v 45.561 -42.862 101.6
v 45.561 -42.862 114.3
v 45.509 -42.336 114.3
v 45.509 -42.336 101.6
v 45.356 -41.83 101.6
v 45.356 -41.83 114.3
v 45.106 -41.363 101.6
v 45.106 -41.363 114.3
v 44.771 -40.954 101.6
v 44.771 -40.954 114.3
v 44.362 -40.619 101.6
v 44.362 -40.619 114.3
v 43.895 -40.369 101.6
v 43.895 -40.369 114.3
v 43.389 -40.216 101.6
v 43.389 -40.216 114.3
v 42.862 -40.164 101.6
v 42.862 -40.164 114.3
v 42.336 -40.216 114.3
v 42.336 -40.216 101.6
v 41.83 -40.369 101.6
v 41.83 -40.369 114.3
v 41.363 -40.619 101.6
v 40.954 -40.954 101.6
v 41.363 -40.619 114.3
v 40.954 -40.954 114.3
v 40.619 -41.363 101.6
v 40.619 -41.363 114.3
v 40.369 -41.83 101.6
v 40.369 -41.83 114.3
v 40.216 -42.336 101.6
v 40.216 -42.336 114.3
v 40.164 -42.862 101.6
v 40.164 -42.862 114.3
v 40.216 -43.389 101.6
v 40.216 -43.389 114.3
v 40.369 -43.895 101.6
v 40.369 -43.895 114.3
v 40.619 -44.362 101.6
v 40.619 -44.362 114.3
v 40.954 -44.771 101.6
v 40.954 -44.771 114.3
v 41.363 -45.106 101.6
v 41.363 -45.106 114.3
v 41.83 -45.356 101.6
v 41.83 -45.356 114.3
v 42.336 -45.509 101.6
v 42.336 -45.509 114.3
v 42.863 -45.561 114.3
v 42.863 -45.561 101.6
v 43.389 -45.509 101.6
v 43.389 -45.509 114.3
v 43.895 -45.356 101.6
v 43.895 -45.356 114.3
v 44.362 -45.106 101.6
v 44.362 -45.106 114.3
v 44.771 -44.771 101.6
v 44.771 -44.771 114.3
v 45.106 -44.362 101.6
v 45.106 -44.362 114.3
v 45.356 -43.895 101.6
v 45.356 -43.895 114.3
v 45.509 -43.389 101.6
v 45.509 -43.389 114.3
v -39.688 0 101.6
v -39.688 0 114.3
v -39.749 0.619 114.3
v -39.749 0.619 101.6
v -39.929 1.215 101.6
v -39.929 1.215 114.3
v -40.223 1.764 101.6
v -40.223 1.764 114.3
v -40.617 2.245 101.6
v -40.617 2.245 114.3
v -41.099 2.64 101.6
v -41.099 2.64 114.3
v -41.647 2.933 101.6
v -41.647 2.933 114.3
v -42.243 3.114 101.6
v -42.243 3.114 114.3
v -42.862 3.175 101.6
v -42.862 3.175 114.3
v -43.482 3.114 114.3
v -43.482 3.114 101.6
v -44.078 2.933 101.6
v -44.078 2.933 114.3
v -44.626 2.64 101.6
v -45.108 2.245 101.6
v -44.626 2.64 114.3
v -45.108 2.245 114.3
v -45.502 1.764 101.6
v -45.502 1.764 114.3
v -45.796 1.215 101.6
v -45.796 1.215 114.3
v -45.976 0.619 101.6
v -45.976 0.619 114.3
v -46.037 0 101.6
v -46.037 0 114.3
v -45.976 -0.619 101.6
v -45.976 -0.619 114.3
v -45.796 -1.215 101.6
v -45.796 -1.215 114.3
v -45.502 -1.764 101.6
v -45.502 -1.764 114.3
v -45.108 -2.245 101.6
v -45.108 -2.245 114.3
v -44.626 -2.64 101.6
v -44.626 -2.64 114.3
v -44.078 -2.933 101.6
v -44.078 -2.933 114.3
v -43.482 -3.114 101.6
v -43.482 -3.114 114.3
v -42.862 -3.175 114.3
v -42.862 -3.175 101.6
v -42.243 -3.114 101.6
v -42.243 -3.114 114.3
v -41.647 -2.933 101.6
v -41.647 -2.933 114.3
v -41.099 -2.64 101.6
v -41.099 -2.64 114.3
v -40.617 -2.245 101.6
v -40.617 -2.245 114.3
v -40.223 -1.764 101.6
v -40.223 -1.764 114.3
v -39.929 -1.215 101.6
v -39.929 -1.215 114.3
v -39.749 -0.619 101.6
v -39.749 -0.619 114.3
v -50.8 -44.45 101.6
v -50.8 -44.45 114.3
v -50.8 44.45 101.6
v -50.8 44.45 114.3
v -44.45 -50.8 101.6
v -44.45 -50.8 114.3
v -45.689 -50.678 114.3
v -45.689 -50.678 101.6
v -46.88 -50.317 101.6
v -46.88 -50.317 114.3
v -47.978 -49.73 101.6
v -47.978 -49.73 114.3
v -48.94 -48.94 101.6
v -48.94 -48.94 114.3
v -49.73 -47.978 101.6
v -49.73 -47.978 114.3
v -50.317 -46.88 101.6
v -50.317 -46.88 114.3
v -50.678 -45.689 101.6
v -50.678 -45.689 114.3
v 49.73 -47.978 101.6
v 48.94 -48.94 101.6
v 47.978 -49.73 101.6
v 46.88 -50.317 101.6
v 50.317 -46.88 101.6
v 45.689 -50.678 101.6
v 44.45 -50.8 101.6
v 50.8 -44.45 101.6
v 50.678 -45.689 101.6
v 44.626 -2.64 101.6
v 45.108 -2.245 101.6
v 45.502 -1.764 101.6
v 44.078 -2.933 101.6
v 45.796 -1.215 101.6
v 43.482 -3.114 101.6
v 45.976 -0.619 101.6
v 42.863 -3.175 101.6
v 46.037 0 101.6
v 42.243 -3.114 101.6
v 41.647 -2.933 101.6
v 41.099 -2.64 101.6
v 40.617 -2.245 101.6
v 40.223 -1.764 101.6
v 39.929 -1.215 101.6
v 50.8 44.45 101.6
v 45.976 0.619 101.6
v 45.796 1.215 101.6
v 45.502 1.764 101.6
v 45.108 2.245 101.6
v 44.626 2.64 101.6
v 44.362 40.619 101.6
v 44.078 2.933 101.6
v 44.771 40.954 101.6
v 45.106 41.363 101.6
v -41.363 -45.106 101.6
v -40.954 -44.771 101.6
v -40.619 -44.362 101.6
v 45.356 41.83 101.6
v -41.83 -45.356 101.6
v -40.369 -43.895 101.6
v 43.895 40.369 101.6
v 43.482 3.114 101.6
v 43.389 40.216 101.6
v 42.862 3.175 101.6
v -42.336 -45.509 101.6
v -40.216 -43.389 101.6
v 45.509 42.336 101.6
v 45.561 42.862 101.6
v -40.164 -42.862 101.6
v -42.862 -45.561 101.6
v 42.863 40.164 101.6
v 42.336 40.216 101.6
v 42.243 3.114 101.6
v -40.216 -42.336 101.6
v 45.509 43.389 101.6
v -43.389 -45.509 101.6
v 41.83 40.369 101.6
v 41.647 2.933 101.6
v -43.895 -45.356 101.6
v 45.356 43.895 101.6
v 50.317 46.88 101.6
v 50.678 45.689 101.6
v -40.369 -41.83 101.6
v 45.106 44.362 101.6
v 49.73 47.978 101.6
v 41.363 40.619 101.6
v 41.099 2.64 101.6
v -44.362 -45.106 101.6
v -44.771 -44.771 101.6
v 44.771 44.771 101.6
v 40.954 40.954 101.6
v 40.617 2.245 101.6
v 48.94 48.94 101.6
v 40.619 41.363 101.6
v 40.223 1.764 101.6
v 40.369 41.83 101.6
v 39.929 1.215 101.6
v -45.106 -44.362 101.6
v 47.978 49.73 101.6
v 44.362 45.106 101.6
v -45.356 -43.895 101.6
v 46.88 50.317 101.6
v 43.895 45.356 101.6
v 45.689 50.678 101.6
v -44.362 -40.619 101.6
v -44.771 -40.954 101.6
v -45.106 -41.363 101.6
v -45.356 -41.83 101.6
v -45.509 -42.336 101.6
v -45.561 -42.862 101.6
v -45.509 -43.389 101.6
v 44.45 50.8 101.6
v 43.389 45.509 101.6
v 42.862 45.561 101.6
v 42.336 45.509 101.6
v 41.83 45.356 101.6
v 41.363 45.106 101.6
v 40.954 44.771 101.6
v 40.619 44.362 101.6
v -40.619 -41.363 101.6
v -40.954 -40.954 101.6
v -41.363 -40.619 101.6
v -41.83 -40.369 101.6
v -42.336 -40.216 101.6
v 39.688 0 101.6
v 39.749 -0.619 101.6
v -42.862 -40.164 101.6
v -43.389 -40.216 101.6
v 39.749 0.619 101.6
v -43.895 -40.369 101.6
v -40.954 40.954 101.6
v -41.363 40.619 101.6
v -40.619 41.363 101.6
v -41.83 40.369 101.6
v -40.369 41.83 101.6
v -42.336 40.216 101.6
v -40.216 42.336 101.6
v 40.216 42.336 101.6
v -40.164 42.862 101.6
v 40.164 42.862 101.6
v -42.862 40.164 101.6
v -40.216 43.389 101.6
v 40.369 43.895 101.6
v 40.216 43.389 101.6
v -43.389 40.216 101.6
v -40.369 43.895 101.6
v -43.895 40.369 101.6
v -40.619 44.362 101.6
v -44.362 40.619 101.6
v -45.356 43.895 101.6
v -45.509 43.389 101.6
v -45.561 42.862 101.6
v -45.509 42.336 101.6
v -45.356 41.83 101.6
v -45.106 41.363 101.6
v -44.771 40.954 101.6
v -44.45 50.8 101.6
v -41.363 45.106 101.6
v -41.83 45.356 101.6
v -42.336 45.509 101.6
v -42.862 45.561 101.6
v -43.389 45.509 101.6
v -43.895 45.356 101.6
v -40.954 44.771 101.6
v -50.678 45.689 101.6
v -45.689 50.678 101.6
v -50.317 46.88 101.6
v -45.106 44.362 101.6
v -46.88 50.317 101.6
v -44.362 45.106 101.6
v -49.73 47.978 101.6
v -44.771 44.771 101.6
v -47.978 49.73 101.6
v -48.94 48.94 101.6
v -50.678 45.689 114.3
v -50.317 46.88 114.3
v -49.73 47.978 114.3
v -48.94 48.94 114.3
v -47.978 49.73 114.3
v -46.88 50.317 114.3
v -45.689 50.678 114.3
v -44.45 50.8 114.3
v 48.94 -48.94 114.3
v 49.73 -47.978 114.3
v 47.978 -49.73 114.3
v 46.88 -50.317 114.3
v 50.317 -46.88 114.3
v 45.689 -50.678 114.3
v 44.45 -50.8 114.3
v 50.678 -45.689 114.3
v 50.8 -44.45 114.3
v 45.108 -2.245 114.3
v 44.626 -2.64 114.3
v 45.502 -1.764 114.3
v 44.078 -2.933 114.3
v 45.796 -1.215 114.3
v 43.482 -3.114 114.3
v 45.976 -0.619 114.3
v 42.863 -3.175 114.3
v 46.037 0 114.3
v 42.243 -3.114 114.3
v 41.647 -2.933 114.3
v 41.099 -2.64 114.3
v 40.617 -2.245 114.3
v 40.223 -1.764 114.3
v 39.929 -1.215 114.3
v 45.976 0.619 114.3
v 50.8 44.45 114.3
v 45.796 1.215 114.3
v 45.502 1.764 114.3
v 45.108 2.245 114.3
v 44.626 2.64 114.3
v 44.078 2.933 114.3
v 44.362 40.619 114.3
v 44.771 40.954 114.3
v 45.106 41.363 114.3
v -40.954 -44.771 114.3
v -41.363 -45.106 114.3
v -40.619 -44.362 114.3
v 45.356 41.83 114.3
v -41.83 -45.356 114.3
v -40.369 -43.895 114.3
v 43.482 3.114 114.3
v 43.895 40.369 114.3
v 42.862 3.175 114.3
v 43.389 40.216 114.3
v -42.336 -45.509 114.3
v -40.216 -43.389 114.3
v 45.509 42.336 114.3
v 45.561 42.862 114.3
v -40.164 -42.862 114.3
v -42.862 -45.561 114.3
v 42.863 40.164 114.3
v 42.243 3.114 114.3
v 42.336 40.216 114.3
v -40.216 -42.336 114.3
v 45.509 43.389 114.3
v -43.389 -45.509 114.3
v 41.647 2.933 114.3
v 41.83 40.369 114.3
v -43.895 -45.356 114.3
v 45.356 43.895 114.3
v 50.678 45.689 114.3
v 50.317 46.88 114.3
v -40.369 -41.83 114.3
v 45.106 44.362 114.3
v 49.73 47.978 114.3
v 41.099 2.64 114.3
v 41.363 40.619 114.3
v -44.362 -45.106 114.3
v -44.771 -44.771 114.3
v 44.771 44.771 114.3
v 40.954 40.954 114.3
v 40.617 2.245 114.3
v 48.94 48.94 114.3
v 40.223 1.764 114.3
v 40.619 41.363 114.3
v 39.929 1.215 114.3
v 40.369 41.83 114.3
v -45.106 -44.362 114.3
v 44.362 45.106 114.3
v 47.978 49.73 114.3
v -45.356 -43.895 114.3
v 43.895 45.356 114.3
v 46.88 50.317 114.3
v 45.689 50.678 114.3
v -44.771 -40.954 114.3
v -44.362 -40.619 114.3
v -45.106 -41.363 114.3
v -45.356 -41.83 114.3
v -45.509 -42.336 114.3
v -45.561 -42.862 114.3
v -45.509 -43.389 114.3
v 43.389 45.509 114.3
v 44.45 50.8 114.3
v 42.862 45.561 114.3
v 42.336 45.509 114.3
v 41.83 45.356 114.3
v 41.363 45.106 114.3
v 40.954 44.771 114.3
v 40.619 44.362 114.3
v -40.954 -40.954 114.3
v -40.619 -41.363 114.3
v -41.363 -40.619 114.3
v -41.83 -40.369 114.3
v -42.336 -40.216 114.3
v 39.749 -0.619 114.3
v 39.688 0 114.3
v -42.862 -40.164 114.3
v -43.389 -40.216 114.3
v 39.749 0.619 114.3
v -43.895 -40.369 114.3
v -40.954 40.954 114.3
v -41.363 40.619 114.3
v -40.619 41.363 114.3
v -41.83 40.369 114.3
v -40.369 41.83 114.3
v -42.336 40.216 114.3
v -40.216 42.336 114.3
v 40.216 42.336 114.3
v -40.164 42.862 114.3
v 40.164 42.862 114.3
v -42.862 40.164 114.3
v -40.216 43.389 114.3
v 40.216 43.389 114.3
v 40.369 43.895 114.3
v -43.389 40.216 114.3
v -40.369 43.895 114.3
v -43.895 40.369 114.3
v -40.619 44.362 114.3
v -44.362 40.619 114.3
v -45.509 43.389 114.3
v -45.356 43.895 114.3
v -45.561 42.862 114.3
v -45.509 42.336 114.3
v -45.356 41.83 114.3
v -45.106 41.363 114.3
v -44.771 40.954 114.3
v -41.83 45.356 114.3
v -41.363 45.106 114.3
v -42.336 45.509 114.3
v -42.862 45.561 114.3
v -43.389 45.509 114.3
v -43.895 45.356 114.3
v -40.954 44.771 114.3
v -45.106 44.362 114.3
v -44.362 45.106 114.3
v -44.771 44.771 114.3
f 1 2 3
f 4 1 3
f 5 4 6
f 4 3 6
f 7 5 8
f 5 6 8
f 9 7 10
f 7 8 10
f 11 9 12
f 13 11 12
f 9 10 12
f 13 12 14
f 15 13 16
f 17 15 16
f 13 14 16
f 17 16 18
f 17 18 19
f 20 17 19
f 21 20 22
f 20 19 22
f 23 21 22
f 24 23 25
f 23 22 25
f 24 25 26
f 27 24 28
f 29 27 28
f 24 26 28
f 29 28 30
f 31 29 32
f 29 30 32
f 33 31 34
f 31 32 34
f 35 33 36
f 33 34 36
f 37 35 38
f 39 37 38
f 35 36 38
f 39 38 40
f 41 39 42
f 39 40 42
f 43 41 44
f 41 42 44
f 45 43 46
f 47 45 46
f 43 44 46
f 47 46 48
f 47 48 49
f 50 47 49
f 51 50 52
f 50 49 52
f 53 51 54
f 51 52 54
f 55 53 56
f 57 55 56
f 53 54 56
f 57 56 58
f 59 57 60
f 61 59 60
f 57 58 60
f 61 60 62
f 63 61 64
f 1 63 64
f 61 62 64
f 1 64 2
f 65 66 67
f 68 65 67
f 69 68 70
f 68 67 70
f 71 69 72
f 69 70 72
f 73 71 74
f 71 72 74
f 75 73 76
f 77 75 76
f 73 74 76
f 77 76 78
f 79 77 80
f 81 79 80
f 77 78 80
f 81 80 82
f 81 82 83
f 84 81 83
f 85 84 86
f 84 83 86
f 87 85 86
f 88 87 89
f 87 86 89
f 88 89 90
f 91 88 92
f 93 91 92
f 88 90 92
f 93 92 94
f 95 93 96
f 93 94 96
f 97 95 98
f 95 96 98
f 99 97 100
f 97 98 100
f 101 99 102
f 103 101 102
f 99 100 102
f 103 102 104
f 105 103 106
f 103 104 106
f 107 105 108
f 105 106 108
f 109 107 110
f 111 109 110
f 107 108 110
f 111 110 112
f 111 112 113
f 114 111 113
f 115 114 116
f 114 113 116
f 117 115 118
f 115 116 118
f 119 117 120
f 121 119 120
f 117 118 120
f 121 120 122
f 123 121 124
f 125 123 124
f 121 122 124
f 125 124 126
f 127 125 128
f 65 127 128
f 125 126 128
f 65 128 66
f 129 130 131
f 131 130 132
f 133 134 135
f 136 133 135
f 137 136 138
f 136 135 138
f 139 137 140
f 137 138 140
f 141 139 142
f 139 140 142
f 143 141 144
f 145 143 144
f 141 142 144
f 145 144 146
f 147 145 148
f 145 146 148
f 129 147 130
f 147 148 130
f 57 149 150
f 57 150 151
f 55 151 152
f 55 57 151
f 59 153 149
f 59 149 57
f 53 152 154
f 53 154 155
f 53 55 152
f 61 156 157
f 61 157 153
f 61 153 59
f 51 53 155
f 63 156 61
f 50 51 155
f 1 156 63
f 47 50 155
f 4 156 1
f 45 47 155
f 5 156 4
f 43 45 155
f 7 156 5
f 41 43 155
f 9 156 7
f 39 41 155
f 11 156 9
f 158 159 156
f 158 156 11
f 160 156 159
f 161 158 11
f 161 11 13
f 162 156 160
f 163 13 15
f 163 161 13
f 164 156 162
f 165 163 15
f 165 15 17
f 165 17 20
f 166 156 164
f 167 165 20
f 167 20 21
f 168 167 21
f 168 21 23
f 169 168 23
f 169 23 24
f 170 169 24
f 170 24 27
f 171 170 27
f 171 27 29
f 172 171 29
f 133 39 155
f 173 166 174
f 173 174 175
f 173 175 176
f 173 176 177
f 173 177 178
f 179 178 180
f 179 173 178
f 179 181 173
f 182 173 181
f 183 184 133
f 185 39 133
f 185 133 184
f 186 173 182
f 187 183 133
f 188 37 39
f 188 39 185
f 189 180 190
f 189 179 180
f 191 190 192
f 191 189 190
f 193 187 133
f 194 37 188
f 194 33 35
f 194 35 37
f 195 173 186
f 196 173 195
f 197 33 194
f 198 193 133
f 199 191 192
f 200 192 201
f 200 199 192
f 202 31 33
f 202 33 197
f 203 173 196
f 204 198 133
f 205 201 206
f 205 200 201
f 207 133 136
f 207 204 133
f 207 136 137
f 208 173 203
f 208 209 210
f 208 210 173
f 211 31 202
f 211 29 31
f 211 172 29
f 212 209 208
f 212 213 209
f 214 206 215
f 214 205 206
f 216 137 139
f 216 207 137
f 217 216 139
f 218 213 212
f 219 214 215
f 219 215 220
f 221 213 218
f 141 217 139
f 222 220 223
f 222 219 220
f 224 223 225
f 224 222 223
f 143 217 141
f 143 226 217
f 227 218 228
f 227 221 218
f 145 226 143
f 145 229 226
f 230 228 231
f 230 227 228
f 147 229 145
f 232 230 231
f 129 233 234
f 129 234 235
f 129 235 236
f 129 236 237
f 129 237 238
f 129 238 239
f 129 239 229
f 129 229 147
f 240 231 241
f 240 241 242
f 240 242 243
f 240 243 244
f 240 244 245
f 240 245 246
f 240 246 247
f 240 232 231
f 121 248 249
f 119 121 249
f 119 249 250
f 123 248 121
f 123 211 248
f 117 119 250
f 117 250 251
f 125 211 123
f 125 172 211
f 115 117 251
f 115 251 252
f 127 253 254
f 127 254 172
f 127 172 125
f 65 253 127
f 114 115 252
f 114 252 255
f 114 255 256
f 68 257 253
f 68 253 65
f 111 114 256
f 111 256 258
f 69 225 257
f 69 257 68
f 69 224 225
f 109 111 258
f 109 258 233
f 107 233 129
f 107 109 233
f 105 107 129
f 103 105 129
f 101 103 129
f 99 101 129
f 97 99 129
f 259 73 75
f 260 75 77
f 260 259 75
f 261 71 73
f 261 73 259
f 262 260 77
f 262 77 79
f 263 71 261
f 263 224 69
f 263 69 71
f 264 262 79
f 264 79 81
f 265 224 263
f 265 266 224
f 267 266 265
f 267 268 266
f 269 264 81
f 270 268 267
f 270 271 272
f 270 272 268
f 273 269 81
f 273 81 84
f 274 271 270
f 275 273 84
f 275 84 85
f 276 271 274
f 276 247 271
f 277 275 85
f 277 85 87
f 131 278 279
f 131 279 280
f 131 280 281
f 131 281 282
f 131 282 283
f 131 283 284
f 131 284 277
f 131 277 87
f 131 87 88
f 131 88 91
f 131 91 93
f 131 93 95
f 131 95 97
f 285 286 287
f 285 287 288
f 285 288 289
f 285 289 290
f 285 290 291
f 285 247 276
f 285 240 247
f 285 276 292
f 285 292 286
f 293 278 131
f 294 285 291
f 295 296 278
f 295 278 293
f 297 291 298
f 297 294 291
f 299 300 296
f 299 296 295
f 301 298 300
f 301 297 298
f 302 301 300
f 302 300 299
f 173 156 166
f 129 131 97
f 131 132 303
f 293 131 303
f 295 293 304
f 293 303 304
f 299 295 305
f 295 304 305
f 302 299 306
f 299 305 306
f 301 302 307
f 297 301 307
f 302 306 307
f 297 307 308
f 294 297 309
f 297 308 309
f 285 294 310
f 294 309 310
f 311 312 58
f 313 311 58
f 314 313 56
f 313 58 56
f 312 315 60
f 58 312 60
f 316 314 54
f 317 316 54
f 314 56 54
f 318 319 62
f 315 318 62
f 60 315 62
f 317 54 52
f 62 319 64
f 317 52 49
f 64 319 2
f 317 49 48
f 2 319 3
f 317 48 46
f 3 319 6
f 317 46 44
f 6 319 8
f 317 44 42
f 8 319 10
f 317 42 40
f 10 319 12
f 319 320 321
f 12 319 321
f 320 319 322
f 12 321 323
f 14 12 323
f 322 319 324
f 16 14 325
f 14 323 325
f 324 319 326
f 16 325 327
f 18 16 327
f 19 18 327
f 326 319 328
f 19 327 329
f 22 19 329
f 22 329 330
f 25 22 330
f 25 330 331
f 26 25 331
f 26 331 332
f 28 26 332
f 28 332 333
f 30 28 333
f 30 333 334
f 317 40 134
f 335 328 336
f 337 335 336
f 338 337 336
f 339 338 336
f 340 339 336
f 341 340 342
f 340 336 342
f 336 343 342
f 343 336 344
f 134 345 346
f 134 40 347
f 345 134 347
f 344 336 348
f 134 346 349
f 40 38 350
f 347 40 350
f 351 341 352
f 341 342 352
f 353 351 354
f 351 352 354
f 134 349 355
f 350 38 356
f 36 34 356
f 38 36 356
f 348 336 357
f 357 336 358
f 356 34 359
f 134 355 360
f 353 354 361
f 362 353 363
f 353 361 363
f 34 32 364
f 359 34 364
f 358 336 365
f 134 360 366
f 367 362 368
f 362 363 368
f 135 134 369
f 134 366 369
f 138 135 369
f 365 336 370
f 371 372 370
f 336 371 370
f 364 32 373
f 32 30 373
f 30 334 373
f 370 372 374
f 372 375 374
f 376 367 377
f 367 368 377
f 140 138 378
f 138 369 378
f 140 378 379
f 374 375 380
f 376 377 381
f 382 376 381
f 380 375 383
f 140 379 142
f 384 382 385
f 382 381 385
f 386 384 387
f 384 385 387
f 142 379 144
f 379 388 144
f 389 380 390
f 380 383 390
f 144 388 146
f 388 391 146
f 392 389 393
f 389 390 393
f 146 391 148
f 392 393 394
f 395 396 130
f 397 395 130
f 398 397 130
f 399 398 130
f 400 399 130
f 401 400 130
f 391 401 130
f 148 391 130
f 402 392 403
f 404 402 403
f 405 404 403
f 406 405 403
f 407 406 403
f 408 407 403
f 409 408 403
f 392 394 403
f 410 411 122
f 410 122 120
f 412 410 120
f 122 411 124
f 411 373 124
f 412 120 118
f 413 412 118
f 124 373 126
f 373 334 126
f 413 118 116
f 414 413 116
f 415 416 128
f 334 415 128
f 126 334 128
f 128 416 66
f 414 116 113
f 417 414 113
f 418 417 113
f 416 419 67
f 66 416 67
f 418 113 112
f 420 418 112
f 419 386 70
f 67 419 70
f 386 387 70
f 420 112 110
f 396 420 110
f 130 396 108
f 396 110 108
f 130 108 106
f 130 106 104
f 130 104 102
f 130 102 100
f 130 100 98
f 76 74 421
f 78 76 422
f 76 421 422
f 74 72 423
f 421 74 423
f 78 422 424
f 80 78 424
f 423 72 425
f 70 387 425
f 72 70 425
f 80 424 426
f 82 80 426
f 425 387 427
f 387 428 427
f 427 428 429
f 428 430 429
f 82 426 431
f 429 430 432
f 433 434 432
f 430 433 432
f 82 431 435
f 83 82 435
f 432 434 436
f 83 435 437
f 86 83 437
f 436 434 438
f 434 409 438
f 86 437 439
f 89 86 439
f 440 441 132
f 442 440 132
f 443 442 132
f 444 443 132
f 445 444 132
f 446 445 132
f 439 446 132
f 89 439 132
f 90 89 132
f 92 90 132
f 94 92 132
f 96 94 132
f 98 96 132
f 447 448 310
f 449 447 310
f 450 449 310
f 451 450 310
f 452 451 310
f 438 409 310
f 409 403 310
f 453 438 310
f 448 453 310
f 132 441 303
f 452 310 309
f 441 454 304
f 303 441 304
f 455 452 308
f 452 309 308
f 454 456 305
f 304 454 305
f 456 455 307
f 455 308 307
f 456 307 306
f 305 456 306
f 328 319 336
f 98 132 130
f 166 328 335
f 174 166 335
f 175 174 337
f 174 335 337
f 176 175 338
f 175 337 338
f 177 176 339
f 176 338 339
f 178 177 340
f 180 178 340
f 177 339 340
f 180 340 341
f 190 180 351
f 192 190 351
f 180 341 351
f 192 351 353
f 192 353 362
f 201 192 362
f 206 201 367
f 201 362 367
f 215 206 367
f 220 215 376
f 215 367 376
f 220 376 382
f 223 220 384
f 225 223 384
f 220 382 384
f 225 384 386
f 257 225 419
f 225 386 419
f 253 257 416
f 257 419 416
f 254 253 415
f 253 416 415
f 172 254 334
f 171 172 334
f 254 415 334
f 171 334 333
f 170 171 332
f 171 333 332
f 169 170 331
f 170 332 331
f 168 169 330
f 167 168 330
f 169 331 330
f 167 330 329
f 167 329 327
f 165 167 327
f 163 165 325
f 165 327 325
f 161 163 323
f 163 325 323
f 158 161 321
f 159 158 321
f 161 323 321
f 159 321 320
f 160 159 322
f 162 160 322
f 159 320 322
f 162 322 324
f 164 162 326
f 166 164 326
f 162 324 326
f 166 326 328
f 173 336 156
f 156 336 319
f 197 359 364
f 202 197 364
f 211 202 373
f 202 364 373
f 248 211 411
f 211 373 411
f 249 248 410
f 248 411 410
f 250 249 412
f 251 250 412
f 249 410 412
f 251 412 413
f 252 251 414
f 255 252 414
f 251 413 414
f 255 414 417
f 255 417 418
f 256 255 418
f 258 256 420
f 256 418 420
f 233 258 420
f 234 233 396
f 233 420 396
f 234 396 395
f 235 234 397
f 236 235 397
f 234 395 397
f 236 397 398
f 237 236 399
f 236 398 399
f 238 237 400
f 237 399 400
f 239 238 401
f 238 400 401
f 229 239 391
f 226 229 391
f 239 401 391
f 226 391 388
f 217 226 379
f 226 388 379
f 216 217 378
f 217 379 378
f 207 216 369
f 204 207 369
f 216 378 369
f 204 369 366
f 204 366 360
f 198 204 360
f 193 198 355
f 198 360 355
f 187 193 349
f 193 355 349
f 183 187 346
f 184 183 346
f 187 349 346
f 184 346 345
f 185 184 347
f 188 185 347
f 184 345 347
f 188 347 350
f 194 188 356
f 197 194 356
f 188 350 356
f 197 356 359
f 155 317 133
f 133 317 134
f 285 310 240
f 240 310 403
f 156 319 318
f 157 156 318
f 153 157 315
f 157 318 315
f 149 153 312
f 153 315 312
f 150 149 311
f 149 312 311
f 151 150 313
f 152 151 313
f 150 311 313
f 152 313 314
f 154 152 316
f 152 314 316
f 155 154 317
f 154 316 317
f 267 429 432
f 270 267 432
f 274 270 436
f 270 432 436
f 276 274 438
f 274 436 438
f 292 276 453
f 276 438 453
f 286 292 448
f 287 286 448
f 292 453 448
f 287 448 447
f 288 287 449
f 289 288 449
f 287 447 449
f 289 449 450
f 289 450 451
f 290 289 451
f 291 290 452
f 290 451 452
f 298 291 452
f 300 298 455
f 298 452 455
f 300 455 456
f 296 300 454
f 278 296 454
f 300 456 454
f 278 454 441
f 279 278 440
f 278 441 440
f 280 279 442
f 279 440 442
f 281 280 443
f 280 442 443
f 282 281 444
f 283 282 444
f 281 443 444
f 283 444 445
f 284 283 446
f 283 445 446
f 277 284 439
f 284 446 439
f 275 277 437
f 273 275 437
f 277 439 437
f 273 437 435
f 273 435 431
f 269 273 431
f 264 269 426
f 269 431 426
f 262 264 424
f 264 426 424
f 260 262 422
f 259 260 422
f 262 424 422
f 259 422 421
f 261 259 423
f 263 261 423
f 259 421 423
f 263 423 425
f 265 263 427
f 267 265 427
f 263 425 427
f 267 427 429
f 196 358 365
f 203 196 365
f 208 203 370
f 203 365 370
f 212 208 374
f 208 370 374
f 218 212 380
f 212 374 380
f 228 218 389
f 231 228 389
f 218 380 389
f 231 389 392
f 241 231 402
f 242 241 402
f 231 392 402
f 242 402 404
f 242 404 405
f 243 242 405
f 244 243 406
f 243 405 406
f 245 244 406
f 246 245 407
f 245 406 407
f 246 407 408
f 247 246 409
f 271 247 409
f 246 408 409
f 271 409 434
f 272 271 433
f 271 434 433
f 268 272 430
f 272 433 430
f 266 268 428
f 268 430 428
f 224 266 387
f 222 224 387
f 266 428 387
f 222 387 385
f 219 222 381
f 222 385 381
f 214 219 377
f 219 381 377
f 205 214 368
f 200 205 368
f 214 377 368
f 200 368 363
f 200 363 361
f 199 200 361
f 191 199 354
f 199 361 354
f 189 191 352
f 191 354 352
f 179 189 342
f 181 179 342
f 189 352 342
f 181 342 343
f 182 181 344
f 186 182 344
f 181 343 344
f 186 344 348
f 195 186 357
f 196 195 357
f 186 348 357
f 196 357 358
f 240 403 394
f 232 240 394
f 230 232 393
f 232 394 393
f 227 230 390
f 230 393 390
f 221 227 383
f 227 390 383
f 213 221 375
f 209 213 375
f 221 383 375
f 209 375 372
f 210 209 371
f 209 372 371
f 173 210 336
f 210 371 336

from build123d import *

# Parameters (mm, degrees)
TOP_PLATE_SKETCH_PROFILE_R   = 3.175
TOP_PLATE_SKETCH_PROFILE_R_2 = 2.69875
TOP_PLATE_EXTRUDE_DEPTH      = 12.7


with BuildPart() as part:
    # Top Plate Sketch Profile → Top Plate Extrude (new body)
    with BuildSketch(Plane.XY.offset(114.3)):
        with BuildLine():
            Line((50.8, 44.45), (50.8, -44.45))
            ThreePointArc((50.8, -44.45), (48.940128061, -48.940128061), (44.45, -50.8))
            Line((44.45, -50.8), (-44.45, -50.8))
            ThreePointArc((-44.45, -50.8), (-48.940128061, -48.940128061), (-50.8, -44.45))
            Line((-50.8, -44.45), (-50.8, 44.45))
            ThreePointArc((-50.8, 44.45), (-48.940128061, 48.940128061), (-44.45, 50.8))
            Line((-44.45, 50.8), (44.45, 50.8))
            ThreePointArc((44.45, 50.8), (48.940128061, 48.940128061), (50.8, 44.45))
        make_face()
        with Locations((42.8625, 0)):
            Circle(TOP_PLATE_SKETCH_PROFILE_R, mode=Mode.SUBTRACT)
        with Locations((-42.8625, 0)):
            Circle(TOP_PLATE_SKETCH_PROFILE_R, mode=Mode.SUBTRACT)
        with Locations((-42.8625, 42.8625)):
            Circle(TOP_PLATE_SKETCH_PROFILE_R_2, mode=Mode.SUBTRACT)
        with Locations((42.8625, 42.8625)):
            Circle(TOP_PLATE_SKETCH_PROFILE_R_2, mode=Mode.SUBTRACT)
        with Locations((42.8625, -42.8625)):
            Circle(TOP_PLATE_SKETCH_PROFILE_R_2, mode=Mode.SUBTRACT)
        with Locations((-42.8625, -42.8625)):
            Circle(TOP_PLATE_SKETCH_PROFILE_R_2, mode=Mode.SUBTRACT)
    extrude(amount=-TOP_PLATE_EXTRUDE_DEPTH)


solid = part.part
